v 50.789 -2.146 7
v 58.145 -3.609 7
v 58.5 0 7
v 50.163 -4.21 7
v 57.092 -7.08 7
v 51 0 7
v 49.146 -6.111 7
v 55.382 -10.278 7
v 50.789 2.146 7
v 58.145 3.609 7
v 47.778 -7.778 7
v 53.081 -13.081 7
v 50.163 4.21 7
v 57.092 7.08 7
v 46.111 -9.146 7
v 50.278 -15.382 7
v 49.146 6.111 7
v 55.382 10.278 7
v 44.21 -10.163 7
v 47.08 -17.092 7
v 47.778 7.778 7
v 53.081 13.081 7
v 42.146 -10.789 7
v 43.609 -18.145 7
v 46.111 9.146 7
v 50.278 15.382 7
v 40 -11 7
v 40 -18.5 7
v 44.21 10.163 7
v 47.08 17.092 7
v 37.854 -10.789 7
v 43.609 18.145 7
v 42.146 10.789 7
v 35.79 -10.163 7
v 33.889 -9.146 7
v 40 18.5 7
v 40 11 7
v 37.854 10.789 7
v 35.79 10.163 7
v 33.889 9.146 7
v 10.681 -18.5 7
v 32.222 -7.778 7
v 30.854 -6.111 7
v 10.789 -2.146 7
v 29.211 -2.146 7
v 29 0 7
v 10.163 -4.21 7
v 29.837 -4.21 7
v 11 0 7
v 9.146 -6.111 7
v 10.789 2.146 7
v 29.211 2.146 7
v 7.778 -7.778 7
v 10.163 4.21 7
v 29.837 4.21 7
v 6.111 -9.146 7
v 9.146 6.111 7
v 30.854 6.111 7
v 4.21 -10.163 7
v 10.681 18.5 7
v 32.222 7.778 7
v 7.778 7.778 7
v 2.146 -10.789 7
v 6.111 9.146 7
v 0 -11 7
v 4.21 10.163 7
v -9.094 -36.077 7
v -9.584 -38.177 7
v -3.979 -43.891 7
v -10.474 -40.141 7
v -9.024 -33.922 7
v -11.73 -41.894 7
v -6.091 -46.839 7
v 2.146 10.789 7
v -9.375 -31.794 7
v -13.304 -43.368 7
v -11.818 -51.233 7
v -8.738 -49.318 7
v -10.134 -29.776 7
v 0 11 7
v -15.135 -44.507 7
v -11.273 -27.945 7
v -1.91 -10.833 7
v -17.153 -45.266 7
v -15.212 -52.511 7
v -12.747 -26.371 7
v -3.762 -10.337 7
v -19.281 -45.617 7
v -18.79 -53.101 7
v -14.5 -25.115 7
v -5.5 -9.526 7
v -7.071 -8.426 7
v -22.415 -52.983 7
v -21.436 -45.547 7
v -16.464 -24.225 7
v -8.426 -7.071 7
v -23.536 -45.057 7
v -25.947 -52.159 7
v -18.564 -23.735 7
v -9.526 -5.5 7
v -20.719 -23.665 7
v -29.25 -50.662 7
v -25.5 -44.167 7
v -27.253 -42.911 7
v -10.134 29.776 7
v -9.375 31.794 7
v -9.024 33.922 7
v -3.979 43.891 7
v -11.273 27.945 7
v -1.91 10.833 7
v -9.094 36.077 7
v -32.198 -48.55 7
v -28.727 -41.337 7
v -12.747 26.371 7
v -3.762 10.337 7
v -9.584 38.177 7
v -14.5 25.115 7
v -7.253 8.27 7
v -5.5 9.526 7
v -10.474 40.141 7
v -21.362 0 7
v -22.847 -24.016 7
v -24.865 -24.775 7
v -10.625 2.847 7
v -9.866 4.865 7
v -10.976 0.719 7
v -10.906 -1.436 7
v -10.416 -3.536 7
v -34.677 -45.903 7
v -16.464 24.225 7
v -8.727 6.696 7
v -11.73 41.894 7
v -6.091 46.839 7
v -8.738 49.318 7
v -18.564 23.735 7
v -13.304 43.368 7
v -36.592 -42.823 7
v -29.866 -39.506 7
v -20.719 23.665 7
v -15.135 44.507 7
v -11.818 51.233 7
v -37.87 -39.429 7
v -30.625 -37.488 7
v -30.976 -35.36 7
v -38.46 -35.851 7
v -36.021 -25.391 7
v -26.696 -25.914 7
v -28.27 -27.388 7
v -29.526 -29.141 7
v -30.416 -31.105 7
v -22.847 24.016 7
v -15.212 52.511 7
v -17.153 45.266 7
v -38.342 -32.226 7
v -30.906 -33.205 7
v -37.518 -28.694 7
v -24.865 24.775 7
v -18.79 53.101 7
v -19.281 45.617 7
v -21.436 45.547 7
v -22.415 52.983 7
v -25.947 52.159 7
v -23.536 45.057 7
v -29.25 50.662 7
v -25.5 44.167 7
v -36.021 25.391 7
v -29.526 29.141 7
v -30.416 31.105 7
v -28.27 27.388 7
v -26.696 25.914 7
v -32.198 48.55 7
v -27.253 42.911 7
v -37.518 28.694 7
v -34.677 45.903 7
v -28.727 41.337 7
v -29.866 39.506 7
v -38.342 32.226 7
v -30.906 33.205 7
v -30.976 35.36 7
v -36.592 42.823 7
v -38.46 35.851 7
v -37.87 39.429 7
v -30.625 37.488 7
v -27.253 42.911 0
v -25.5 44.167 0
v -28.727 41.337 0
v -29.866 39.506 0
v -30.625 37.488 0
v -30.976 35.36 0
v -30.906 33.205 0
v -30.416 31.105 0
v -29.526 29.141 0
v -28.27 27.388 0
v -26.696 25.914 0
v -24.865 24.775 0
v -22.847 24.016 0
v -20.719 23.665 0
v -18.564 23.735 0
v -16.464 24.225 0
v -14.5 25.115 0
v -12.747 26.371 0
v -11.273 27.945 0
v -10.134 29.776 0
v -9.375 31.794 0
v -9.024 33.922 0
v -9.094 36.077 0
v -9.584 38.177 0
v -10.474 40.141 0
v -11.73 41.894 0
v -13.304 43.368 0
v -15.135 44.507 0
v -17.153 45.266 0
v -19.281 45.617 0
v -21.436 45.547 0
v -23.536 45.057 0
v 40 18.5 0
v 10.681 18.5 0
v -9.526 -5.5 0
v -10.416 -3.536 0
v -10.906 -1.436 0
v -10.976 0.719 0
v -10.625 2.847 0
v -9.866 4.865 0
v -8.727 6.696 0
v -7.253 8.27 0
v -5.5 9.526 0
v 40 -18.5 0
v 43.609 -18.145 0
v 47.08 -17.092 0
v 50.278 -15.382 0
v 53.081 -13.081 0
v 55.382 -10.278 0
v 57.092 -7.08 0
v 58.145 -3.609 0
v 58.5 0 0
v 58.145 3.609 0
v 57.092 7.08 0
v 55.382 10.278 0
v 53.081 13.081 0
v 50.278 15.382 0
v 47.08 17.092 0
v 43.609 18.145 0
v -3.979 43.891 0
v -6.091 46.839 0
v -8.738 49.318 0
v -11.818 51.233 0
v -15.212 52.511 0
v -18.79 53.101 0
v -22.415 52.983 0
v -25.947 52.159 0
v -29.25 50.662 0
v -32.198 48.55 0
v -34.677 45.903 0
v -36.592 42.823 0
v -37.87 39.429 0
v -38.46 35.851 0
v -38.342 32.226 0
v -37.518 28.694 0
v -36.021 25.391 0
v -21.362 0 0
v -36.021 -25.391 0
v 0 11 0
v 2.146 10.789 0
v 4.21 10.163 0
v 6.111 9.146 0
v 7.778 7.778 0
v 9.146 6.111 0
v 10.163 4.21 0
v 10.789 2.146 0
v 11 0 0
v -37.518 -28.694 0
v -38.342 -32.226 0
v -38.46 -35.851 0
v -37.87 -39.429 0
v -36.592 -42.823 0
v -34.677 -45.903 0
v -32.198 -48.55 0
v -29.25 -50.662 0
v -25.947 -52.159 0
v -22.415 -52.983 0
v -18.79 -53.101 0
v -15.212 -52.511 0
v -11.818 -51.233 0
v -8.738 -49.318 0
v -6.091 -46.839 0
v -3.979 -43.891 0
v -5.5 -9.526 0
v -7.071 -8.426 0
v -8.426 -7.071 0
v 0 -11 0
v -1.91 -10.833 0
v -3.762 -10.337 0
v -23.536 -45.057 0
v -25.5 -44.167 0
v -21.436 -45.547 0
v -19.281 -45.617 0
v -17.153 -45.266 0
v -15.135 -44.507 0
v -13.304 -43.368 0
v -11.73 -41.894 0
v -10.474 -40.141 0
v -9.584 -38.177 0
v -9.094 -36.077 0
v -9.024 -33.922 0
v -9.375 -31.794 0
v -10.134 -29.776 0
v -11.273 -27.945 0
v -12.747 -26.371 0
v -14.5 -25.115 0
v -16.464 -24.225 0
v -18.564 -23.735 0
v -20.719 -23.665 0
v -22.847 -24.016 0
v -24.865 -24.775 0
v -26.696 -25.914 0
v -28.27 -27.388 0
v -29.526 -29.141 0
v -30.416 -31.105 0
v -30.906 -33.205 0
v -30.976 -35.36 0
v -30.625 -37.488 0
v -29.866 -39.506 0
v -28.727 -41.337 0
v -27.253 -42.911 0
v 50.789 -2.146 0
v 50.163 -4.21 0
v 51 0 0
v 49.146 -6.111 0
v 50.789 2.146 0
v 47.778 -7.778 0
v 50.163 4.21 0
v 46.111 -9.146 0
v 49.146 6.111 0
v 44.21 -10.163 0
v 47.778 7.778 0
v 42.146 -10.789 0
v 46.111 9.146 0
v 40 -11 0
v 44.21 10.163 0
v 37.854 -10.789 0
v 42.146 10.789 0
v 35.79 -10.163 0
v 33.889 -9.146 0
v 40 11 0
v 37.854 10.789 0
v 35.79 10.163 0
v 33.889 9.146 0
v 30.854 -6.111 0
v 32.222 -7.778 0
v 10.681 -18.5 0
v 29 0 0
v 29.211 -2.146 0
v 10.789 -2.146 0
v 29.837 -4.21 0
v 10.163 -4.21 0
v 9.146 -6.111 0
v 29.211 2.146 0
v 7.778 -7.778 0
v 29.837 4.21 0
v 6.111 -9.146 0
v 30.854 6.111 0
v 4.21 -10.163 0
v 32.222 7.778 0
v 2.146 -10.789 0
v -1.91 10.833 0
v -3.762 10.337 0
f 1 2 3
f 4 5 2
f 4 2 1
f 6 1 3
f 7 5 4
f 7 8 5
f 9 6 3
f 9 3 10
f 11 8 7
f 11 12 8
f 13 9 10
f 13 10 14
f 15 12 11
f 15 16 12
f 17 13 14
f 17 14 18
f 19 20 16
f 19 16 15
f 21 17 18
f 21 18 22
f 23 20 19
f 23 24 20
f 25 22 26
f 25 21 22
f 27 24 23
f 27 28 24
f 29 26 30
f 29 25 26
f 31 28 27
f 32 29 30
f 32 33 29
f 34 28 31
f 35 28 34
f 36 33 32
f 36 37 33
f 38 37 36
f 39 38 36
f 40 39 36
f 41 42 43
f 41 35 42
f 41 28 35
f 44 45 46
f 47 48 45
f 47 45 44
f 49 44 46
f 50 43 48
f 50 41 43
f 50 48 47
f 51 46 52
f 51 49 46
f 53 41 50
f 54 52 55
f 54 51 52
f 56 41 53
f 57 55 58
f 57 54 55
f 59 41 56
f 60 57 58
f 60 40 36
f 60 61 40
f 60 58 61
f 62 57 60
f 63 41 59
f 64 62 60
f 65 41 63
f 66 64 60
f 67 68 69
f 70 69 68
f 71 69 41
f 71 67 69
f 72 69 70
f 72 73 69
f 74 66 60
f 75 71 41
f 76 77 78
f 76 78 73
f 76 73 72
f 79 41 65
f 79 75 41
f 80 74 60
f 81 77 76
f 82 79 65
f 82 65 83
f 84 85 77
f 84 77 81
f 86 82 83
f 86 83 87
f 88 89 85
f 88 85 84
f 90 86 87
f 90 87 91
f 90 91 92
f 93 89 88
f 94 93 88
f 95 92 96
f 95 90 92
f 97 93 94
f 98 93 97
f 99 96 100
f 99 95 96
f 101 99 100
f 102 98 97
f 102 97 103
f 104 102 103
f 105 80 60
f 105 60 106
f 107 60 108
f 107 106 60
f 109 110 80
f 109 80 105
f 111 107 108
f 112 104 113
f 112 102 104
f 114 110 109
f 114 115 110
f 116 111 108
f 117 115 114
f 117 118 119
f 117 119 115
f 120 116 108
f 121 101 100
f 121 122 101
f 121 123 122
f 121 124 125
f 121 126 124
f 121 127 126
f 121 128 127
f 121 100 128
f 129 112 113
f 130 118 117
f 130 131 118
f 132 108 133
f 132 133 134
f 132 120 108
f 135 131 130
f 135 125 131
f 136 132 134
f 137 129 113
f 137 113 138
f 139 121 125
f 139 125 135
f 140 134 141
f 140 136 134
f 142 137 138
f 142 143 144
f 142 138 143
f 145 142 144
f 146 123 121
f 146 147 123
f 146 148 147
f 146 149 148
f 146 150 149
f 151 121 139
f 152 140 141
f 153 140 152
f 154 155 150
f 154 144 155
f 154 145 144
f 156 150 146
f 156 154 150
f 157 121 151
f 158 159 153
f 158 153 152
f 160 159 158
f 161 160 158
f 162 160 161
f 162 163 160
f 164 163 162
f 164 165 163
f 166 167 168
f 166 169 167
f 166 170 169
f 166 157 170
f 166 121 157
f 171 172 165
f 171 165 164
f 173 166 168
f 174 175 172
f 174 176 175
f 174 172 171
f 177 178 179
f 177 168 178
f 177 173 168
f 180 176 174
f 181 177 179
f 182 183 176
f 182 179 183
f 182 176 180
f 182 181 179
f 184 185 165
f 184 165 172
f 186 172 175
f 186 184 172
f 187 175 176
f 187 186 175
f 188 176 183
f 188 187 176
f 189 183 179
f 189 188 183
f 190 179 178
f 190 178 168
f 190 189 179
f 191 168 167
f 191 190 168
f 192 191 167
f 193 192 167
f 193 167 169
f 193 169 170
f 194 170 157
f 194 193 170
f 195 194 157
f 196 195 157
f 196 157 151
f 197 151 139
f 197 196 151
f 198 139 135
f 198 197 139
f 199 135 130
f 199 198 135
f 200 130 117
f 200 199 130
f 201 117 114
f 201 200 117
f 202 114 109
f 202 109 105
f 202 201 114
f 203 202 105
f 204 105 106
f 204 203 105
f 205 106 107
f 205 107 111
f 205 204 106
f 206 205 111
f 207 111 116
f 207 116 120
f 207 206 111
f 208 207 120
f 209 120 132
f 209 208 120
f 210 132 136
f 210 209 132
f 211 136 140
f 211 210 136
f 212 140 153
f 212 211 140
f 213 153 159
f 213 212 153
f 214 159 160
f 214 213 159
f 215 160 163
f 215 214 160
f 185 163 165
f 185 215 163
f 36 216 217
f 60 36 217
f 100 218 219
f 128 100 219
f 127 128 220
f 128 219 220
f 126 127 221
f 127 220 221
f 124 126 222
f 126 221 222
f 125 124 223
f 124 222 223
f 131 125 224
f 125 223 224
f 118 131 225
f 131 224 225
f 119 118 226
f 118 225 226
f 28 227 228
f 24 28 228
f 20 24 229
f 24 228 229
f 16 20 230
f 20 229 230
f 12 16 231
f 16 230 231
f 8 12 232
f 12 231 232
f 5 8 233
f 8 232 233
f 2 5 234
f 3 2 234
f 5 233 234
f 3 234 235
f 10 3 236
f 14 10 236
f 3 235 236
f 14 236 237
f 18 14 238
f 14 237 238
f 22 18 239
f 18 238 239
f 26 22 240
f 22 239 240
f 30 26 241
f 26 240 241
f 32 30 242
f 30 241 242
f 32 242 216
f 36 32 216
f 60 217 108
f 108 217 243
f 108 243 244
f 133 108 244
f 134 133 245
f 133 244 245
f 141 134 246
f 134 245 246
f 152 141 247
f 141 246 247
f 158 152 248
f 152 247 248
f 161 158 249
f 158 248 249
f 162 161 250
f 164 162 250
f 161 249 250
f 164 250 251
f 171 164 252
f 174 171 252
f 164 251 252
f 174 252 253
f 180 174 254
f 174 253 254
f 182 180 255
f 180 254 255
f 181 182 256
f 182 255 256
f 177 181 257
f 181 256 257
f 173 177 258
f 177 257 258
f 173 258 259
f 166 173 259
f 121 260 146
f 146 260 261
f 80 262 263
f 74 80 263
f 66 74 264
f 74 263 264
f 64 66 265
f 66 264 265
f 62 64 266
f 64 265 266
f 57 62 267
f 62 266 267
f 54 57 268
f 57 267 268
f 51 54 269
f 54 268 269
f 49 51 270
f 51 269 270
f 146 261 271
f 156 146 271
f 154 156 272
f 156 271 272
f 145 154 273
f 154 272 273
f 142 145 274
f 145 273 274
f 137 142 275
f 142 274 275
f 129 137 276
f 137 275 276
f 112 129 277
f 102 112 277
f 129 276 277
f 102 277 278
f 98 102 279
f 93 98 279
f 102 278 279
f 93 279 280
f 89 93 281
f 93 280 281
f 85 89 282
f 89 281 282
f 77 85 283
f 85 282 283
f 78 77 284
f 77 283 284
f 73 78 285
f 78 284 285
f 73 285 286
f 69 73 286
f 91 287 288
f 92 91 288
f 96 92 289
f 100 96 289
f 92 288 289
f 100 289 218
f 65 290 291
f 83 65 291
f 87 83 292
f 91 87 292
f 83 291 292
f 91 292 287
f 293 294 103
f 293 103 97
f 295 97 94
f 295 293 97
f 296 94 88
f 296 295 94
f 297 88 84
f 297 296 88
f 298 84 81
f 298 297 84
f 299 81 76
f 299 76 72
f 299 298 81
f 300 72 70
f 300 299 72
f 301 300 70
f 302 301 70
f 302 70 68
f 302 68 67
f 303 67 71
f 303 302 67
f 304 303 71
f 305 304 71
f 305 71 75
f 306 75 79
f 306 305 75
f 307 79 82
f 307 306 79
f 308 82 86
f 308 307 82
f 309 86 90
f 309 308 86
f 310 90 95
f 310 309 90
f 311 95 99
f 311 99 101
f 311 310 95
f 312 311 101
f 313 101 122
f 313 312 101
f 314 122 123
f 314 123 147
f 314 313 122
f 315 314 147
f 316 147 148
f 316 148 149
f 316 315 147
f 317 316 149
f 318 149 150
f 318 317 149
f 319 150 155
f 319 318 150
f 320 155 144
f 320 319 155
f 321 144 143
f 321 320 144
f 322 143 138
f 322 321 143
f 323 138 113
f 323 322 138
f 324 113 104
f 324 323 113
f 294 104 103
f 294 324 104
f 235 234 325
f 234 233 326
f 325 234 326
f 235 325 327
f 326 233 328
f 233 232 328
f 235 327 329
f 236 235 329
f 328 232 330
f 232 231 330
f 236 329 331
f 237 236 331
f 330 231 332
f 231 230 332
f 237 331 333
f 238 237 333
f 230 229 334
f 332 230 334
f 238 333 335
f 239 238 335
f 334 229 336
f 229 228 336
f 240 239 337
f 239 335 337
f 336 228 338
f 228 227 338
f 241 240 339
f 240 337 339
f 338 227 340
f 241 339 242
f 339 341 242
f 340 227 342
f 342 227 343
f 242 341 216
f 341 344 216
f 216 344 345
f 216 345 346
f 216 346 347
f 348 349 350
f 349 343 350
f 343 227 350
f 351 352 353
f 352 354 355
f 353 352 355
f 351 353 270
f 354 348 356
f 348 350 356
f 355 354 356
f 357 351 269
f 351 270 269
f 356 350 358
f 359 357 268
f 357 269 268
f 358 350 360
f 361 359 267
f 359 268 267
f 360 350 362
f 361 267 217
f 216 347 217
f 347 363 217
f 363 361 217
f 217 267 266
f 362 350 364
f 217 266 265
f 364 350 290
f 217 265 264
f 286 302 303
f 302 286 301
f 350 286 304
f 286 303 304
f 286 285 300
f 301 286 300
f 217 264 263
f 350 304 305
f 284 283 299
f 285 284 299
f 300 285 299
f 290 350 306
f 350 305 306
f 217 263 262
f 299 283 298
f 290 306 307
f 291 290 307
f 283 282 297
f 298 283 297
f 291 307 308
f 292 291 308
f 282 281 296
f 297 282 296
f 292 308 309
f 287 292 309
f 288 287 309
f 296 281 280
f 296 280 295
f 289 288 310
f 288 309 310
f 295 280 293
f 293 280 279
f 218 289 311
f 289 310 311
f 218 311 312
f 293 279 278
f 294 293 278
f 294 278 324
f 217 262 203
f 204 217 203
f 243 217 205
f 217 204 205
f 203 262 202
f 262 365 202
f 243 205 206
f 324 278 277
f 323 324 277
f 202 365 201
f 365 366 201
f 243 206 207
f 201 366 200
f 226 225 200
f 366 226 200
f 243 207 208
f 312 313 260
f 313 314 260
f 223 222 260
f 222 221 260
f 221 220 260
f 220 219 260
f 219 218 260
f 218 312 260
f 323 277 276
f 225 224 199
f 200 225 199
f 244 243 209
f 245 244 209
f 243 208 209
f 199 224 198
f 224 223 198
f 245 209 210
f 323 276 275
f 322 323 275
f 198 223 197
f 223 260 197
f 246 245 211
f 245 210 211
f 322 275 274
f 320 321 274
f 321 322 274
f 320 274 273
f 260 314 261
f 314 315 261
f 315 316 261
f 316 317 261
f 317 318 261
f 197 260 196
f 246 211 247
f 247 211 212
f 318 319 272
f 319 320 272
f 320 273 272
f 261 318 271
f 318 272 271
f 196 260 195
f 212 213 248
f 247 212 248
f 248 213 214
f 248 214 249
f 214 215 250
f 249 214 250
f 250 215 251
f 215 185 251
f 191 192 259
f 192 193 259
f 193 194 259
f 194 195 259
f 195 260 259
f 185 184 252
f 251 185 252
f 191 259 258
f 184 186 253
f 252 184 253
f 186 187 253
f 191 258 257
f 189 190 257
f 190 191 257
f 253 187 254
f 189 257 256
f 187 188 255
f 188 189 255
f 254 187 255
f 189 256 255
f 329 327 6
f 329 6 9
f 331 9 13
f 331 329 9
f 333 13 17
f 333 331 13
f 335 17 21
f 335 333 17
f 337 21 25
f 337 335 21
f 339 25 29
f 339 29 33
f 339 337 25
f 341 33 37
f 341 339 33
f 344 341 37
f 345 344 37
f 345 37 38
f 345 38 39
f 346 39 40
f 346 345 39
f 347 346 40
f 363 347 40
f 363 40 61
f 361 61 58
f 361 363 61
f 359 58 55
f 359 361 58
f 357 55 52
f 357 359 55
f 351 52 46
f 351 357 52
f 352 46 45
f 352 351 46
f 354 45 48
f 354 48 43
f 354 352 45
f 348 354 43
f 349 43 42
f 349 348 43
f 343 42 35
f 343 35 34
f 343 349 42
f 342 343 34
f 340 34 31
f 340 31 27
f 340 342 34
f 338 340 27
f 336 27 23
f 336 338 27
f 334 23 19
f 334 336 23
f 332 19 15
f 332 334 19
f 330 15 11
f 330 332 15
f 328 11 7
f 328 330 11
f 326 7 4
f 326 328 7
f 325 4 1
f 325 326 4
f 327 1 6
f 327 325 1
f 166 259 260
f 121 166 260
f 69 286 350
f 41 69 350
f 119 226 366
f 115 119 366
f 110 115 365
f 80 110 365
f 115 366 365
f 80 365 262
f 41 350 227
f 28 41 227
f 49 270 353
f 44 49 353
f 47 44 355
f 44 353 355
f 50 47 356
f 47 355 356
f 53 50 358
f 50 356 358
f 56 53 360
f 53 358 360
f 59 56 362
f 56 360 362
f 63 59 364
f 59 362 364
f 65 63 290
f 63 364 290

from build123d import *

# Parameters (mm, degrees)
F0_R            = 11
F1_DEPTH        = 7
F1_COPIES_COUNT = 3


# Not quite as in the source:
# - a pattern or mirror of a feature is missing from the dataset's text; its kind, count and spacing are read off the source's solid


with BuildPart() as f1:
    # F0 (on Top) → F1 (new body)
    with BuildSketch(Plane.XY):
        with BuildLine():
            ThreePointArc((0, 11), (7.7781745931, 7.7781745931), (11, 0))
            ThreePointArc((11, 0), (7.7781745931, -7.7781745931), (0, -11))
            Line((0, -11), (0, -18.5))
            Line((0, -18.5), (40, -18.5))
            ThreePointArc((40, -18.5), (58.5, 0), (40, 18.5))
            Line((40, 18.5), (0, 18.5))
            Line((0, 18.5), (0, 11))
        make_face()
        with Locations((40, 0)):
            Circle(F0_R, mode=Mode.SUBTRACT)
    extrude(amount=F1_DEPTH)

    # F1_copies: F1 ×3 about axis
    f1_copies_axis = Axis((0, 0, 0), (0, 0, 1))


with BuildPart() as f1_1:
    add(f1.part)
    for i in range(1, F1_COPIES_COUNT):
        add(f1.part.rotate(f1_copies_axis, i * 360 / F1_COPIES_COUNT))


solid = f1_1.part
